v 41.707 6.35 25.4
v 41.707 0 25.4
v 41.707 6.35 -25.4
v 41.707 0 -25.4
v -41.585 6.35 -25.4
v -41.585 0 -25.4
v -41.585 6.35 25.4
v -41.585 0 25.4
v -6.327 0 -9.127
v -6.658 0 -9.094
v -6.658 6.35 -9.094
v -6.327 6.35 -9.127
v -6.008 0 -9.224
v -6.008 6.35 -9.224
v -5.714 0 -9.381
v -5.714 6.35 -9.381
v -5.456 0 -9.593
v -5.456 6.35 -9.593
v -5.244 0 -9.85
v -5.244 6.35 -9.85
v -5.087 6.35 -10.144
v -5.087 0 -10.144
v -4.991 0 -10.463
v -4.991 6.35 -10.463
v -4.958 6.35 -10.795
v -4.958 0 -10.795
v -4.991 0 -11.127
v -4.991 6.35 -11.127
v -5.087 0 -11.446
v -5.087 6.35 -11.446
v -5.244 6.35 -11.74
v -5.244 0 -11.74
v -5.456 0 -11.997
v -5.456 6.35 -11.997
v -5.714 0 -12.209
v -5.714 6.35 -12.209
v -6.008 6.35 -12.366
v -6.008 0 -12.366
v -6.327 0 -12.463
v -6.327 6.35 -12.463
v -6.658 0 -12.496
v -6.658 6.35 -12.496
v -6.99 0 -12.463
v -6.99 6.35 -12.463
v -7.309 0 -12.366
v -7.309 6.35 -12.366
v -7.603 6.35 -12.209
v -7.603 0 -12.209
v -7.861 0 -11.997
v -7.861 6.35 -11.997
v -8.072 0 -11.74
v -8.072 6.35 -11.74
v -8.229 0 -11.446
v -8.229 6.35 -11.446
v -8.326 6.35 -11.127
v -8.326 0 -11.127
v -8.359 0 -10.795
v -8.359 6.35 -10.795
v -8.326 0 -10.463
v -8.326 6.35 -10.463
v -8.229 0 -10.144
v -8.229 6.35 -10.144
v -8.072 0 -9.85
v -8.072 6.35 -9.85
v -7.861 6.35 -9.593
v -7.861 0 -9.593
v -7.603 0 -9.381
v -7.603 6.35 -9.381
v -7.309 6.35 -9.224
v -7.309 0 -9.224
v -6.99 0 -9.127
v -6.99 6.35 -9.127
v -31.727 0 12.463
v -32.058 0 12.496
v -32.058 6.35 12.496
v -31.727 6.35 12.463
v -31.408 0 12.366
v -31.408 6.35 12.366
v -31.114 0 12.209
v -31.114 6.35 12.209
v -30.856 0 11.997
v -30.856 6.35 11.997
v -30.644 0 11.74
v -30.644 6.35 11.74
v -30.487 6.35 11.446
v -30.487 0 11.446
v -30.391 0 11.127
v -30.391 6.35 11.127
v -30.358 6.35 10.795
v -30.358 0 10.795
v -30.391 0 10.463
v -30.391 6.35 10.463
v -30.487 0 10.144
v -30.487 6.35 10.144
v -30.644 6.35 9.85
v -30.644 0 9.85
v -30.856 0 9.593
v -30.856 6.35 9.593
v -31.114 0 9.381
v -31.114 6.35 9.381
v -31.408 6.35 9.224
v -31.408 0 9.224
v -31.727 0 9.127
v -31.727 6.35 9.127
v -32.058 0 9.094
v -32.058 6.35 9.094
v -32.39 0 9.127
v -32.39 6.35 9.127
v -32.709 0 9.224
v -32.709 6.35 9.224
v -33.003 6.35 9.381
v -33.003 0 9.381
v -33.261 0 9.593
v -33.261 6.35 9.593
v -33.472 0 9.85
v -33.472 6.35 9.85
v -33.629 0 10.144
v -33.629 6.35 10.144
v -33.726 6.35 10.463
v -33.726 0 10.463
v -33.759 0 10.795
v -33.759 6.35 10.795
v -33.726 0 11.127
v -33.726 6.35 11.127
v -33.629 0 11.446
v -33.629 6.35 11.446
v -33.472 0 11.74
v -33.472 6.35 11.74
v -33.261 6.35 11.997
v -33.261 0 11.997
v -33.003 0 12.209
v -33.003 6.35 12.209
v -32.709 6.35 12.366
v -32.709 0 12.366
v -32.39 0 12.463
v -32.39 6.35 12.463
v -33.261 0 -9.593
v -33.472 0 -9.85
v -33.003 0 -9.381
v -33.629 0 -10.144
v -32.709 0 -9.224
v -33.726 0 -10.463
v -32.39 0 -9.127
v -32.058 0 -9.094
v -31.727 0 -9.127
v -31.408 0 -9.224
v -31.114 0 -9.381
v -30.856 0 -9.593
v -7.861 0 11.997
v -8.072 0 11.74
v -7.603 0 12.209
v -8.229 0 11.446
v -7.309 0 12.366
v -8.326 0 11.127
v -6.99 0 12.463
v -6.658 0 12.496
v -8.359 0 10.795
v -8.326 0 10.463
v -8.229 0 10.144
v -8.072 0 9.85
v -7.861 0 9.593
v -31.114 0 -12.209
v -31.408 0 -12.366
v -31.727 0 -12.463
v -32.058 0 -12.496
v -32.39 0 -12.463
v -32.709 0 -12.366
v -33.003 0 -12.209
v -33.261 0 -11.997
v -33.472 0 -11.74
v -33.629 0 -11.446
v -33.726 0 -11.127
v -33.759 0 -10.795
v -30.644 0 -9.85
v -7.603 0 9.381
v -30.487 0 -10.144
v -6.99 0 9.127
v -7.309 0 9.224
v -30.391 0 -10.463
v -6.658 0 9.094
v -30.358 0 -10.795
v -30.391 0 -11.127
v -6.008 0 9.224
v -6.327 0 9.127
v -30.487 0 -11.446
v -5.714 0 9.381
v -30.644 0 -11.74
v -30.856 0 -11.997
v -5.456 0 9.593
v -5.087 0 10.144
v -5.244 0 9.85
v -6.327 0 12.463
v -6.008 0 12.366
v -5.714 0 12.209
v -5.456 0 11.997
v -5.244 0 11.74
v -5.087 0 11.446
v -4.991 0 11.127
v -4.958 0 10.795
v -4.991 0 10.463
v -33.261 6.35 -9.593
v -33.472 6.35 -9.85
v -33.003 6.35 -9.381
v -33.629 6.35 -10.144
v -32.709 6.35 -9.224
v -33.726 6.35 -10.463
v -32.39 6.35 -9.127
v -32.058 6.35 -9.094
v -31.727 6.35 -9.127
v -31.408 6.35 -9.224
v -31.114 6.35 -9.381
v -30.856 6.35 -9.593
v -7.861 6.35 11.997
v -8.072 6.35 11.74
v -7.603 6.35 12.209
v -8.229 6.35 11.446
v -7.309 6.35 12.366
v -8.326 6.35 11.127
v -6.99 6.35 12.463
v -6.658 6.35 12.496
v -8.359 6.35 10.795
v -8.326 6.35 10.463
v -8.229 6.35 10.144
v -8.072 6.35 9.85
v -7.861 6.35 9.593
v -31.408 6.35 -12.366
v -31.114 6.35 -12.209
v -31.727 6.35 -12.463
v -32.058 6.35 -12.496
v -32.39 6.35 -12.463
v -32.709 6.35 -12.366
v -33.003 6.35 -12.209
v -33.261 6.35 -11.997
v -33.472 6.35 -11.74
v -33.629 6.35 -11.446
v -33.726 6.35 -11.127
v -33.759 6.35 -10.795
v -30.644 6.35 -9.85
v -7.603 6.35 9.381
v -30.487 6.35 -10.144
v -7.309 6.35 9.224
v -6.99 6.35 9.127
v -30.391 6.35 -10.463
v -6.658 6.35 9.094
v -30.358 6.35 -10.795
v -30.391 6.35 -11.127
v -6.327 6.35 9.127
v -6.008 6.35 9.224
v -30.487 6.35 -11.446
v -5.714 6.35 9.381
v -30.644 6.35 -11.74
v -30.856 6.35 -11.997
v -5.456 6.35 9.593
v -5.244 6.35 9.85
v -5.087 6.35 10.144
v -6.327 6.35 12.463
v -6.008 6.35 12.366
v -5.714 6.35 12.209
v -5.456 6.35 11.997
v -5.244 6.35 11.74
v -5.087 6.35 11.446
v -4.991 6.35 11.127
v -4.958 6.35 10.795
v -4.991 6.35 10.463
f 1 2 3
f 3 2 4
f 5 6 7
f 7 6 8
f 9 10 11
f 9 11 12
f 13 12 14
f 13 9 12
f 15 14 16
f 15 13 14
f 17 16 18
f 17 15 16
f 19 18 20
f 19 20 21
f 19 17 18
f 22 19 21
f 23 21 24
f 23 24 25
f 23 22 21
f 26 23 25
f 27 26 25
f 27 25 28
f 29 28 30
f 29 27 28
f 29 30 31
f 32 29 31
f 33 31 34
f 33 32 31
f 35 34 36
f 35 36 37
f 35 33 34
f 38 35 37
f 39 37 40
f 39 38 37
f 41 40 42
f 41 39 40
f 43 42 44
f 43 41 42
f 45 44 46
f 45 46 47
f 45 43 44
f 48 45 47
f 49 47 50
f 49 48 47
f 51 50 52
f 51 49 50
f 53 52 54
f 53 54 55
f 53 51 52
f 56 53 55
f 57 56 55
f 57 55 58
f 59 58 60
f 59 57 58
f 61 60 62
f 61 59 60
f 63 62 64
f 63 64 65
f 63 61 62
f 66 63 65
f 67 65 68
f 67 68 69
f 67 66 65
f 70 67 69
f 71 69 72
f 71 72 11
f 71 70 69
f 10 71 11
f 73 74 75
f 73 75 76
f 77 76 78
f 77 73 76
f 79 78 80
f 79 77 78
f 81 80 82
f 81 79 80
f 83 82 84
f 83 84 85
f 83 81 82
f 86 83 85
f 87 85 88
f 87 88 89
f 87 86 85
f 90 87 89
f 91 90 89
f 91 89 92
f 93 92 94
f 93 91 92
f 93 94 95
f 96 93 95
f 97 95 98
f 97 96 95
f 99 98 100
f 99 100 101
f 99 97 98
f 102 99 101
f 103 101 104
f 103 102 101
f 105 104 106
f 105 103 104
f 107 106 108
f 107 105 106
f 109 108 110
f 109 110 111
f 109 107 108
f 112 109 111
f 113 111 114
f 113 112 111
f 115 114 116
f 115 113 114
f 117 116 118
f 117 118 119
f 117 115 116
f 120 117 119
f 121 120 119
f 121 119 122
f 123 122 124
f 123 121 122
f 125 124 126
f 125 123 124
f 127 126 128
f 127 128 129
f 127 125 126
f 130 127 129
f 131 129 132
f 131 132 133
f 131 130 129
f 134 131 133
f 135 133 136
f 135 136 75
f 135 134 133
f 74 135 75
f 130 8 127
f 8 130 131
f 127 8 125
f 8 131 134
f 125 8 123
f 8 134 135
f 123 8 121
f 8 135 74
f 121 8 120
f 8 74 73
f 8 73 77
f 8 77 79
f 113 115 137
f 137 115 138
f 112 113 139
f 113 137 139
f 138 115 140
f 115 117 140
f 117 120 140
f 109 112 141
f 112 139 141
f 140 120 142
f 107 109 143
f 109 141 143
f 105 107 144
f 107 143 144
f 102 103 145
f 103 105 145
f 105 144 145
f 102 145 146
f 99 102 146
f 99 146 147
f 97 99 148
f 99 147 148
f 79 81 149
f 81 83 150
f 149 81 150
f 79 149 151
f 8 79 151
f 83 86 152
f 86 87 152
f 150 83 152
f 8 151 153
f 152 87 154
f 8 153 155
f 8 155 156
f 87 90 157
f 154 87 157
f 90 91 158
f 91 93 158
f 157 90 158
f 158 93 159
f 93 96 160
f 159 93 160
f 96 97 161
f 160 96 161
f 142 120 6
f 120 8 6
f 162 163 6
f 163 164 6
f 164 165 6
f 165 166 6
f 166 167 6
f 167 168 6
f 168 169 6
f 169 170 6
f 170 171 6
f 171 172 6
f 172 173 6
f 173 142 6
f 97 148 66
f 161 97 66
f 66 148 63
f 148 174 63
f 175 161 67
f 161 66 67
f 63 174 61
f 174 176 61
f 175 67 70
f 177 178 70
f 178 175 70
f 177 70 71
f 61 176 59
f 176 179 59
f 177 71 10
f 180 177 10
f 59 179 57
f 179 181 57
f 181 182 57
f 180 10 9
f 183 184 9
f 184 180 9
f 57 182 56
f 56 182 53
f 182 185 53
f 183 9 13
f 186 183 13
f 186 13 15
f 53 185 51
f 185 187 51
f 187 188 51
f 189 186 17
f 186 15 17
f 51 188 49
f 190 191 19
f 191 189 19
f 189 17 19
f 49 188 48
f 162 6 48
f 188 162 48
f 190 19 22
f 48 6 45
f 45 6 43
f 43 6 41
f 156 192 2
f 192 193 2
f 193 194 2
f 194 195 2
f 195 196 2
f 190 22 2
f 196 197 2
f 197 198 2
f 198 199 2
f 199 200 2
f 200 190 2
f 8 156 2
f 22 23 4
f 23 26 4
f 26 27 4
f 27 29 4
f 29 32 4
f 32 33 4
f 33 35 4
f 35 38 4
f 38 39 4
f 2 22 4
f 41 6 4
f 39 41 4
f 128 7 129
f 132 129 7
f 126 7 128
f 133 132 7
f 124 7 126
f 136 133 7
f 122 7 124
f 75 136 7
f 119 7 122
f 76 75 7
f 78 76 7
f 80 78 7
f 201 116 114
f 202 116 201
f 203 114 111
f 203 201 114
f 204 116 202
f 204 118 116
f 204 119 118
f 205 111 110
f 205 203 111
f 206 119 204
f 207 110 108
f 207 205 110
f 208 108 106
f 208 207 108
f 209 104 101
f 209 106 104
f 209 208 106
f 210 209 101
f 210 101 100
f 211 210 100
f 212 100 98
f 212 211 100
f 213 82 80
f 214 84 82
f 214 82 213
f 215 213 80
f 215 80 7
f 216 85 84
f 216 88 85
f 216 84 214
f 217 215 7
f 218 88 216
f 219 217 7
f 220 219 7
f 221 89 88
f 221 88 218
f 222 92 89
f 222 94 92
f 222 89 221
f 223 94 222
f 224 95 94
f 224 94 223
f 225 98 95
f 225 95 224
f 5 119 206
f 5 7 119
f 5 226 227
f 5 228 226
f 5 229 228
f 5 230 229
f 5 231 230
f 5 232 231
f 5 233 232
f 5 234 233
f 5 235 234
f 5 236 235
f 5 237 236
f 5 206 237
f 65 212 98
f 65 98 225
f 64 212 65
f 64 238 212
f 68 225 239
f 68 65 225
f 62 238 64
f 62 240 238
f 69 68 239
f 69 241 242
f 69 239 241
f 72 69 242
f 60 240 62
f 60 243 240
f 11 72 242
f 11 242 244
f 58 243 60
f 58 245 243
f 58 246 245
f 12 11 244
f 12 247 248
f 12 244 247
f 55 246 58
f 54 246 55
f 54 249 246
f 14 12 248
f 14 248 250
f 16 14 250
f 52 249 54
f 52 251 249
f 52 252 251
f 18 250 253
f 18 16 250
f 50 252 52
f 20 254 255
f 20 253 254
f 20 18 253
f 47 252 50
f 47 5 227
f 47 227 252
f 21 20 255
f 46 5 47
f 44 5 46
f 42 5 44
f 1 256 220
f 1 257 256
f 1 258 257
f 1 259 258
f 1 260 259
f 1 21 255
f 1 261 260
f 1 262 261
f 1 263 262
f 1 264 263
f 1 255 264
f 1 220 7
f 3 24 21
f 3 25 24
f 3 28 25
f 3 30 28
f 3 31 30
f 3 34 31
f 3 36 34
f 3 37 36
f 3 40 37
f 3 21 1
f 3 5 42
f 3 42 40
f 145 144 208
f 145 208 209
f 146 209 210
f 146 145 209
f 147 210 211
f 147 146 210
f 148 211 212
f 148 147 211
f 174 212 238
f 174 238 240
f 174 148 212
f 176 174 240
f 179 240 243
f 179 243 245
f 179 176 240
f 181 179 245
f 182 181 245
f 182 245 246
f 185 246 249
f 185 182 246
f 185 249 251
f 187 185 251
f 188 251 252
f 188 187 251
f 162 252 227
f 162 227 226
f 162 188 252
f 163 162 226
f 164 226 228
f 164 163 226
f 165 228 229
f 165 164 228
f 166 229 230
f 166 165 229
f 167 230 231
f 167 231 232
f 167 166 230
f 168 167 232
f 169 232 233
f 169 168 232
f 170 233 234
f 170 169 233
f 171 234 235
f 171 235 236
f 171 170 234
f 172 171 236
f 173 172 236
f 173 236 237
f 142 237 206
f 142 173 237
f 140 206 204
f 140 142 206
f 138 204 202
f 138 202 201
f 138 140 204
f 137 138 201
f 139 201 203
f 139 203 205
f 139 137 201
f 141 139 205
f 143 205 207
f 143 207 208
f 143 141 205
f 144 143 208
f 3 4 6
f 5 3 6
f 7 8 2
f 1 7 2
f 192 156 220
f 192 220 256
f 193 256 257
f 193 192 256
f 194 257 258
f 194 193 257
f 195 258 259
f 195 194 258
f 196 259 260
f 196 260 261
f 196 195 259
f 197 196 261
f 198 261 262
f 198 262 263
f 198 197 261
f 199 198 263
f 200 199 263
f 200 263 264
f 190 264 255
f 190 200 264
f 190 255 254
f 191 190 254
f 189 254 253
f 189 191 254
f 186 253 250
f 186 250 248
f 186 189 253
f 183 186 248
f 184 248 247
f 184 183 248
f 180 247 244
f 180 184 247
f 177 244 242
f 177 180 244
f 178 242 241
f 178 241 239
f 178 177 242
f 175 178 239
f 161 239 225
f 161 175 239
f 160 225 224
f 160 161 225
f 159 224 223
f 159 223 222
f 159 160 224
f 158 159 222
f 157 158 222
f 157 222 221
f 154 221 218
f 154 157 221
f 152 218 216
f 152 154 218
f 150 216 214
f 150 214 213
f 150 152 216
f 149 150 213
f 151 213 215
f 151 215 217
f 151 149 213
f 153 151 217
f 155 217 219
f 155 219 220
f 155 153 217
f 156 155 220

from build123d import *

# Parameters (mm, degrees)
SKETCH1_R           = 1.70053
BOSS_EXTRUDE1_DEPTH = 6.35


with BuildPart() as part:
    # Sketch1 → Boss-Extrude1 (new body)
    with BuildSketch(Plane(origin=(0, 0, 0), x_dir=(1, 0, 0), z_dir=(0, 1, 0))):
        Polygon((-25.233245497, -25.4), (-6.59007041, -25.4), (6.712481409, -25.4), (25.355656497, -25.4), (38.658208316, -25.4), (41.7070455, -25.4), (41.7070455, 25.4), (38.658208316, 25.4), (25.355656497, 25.4), (6.712481409, 25.4), (0.0612055, 25.4), (-6.59007041, 25.4), (-25.233245497, 25.4), (-38.535797316, 25.4), (-41.5846345, 25.4), (-41.5846345, -25.4), (-38.535797316, -25.4), align=None)
        with Locations(Location((-32.0583645, 10.795, 0), (0, 0, 270))):
            Circle(SKETCH1_R, mode=Mode.SUBTRACT)
        with Locations(Location((-32.0583645, -10.795, 0), (0, 0, 270))):
            Circle(SKETCH1_R, mode=Mode.SUBTRACT)
        with Locations(Location((-6.6583645, -10.795, 0), (0, 0, 270))):
            Circle(SKETCH1_R, mode=Mode.SUBTRACT)
        with Locations(Location((-6.6583645, 10.795, 0), (0, 0, 270))):
            Circle(SKETCH1_R, mode=Mode.SUBTRACT)
    extrude(amount=BOSS_EXTRUDE1_DEPTH)


solid = part.part
